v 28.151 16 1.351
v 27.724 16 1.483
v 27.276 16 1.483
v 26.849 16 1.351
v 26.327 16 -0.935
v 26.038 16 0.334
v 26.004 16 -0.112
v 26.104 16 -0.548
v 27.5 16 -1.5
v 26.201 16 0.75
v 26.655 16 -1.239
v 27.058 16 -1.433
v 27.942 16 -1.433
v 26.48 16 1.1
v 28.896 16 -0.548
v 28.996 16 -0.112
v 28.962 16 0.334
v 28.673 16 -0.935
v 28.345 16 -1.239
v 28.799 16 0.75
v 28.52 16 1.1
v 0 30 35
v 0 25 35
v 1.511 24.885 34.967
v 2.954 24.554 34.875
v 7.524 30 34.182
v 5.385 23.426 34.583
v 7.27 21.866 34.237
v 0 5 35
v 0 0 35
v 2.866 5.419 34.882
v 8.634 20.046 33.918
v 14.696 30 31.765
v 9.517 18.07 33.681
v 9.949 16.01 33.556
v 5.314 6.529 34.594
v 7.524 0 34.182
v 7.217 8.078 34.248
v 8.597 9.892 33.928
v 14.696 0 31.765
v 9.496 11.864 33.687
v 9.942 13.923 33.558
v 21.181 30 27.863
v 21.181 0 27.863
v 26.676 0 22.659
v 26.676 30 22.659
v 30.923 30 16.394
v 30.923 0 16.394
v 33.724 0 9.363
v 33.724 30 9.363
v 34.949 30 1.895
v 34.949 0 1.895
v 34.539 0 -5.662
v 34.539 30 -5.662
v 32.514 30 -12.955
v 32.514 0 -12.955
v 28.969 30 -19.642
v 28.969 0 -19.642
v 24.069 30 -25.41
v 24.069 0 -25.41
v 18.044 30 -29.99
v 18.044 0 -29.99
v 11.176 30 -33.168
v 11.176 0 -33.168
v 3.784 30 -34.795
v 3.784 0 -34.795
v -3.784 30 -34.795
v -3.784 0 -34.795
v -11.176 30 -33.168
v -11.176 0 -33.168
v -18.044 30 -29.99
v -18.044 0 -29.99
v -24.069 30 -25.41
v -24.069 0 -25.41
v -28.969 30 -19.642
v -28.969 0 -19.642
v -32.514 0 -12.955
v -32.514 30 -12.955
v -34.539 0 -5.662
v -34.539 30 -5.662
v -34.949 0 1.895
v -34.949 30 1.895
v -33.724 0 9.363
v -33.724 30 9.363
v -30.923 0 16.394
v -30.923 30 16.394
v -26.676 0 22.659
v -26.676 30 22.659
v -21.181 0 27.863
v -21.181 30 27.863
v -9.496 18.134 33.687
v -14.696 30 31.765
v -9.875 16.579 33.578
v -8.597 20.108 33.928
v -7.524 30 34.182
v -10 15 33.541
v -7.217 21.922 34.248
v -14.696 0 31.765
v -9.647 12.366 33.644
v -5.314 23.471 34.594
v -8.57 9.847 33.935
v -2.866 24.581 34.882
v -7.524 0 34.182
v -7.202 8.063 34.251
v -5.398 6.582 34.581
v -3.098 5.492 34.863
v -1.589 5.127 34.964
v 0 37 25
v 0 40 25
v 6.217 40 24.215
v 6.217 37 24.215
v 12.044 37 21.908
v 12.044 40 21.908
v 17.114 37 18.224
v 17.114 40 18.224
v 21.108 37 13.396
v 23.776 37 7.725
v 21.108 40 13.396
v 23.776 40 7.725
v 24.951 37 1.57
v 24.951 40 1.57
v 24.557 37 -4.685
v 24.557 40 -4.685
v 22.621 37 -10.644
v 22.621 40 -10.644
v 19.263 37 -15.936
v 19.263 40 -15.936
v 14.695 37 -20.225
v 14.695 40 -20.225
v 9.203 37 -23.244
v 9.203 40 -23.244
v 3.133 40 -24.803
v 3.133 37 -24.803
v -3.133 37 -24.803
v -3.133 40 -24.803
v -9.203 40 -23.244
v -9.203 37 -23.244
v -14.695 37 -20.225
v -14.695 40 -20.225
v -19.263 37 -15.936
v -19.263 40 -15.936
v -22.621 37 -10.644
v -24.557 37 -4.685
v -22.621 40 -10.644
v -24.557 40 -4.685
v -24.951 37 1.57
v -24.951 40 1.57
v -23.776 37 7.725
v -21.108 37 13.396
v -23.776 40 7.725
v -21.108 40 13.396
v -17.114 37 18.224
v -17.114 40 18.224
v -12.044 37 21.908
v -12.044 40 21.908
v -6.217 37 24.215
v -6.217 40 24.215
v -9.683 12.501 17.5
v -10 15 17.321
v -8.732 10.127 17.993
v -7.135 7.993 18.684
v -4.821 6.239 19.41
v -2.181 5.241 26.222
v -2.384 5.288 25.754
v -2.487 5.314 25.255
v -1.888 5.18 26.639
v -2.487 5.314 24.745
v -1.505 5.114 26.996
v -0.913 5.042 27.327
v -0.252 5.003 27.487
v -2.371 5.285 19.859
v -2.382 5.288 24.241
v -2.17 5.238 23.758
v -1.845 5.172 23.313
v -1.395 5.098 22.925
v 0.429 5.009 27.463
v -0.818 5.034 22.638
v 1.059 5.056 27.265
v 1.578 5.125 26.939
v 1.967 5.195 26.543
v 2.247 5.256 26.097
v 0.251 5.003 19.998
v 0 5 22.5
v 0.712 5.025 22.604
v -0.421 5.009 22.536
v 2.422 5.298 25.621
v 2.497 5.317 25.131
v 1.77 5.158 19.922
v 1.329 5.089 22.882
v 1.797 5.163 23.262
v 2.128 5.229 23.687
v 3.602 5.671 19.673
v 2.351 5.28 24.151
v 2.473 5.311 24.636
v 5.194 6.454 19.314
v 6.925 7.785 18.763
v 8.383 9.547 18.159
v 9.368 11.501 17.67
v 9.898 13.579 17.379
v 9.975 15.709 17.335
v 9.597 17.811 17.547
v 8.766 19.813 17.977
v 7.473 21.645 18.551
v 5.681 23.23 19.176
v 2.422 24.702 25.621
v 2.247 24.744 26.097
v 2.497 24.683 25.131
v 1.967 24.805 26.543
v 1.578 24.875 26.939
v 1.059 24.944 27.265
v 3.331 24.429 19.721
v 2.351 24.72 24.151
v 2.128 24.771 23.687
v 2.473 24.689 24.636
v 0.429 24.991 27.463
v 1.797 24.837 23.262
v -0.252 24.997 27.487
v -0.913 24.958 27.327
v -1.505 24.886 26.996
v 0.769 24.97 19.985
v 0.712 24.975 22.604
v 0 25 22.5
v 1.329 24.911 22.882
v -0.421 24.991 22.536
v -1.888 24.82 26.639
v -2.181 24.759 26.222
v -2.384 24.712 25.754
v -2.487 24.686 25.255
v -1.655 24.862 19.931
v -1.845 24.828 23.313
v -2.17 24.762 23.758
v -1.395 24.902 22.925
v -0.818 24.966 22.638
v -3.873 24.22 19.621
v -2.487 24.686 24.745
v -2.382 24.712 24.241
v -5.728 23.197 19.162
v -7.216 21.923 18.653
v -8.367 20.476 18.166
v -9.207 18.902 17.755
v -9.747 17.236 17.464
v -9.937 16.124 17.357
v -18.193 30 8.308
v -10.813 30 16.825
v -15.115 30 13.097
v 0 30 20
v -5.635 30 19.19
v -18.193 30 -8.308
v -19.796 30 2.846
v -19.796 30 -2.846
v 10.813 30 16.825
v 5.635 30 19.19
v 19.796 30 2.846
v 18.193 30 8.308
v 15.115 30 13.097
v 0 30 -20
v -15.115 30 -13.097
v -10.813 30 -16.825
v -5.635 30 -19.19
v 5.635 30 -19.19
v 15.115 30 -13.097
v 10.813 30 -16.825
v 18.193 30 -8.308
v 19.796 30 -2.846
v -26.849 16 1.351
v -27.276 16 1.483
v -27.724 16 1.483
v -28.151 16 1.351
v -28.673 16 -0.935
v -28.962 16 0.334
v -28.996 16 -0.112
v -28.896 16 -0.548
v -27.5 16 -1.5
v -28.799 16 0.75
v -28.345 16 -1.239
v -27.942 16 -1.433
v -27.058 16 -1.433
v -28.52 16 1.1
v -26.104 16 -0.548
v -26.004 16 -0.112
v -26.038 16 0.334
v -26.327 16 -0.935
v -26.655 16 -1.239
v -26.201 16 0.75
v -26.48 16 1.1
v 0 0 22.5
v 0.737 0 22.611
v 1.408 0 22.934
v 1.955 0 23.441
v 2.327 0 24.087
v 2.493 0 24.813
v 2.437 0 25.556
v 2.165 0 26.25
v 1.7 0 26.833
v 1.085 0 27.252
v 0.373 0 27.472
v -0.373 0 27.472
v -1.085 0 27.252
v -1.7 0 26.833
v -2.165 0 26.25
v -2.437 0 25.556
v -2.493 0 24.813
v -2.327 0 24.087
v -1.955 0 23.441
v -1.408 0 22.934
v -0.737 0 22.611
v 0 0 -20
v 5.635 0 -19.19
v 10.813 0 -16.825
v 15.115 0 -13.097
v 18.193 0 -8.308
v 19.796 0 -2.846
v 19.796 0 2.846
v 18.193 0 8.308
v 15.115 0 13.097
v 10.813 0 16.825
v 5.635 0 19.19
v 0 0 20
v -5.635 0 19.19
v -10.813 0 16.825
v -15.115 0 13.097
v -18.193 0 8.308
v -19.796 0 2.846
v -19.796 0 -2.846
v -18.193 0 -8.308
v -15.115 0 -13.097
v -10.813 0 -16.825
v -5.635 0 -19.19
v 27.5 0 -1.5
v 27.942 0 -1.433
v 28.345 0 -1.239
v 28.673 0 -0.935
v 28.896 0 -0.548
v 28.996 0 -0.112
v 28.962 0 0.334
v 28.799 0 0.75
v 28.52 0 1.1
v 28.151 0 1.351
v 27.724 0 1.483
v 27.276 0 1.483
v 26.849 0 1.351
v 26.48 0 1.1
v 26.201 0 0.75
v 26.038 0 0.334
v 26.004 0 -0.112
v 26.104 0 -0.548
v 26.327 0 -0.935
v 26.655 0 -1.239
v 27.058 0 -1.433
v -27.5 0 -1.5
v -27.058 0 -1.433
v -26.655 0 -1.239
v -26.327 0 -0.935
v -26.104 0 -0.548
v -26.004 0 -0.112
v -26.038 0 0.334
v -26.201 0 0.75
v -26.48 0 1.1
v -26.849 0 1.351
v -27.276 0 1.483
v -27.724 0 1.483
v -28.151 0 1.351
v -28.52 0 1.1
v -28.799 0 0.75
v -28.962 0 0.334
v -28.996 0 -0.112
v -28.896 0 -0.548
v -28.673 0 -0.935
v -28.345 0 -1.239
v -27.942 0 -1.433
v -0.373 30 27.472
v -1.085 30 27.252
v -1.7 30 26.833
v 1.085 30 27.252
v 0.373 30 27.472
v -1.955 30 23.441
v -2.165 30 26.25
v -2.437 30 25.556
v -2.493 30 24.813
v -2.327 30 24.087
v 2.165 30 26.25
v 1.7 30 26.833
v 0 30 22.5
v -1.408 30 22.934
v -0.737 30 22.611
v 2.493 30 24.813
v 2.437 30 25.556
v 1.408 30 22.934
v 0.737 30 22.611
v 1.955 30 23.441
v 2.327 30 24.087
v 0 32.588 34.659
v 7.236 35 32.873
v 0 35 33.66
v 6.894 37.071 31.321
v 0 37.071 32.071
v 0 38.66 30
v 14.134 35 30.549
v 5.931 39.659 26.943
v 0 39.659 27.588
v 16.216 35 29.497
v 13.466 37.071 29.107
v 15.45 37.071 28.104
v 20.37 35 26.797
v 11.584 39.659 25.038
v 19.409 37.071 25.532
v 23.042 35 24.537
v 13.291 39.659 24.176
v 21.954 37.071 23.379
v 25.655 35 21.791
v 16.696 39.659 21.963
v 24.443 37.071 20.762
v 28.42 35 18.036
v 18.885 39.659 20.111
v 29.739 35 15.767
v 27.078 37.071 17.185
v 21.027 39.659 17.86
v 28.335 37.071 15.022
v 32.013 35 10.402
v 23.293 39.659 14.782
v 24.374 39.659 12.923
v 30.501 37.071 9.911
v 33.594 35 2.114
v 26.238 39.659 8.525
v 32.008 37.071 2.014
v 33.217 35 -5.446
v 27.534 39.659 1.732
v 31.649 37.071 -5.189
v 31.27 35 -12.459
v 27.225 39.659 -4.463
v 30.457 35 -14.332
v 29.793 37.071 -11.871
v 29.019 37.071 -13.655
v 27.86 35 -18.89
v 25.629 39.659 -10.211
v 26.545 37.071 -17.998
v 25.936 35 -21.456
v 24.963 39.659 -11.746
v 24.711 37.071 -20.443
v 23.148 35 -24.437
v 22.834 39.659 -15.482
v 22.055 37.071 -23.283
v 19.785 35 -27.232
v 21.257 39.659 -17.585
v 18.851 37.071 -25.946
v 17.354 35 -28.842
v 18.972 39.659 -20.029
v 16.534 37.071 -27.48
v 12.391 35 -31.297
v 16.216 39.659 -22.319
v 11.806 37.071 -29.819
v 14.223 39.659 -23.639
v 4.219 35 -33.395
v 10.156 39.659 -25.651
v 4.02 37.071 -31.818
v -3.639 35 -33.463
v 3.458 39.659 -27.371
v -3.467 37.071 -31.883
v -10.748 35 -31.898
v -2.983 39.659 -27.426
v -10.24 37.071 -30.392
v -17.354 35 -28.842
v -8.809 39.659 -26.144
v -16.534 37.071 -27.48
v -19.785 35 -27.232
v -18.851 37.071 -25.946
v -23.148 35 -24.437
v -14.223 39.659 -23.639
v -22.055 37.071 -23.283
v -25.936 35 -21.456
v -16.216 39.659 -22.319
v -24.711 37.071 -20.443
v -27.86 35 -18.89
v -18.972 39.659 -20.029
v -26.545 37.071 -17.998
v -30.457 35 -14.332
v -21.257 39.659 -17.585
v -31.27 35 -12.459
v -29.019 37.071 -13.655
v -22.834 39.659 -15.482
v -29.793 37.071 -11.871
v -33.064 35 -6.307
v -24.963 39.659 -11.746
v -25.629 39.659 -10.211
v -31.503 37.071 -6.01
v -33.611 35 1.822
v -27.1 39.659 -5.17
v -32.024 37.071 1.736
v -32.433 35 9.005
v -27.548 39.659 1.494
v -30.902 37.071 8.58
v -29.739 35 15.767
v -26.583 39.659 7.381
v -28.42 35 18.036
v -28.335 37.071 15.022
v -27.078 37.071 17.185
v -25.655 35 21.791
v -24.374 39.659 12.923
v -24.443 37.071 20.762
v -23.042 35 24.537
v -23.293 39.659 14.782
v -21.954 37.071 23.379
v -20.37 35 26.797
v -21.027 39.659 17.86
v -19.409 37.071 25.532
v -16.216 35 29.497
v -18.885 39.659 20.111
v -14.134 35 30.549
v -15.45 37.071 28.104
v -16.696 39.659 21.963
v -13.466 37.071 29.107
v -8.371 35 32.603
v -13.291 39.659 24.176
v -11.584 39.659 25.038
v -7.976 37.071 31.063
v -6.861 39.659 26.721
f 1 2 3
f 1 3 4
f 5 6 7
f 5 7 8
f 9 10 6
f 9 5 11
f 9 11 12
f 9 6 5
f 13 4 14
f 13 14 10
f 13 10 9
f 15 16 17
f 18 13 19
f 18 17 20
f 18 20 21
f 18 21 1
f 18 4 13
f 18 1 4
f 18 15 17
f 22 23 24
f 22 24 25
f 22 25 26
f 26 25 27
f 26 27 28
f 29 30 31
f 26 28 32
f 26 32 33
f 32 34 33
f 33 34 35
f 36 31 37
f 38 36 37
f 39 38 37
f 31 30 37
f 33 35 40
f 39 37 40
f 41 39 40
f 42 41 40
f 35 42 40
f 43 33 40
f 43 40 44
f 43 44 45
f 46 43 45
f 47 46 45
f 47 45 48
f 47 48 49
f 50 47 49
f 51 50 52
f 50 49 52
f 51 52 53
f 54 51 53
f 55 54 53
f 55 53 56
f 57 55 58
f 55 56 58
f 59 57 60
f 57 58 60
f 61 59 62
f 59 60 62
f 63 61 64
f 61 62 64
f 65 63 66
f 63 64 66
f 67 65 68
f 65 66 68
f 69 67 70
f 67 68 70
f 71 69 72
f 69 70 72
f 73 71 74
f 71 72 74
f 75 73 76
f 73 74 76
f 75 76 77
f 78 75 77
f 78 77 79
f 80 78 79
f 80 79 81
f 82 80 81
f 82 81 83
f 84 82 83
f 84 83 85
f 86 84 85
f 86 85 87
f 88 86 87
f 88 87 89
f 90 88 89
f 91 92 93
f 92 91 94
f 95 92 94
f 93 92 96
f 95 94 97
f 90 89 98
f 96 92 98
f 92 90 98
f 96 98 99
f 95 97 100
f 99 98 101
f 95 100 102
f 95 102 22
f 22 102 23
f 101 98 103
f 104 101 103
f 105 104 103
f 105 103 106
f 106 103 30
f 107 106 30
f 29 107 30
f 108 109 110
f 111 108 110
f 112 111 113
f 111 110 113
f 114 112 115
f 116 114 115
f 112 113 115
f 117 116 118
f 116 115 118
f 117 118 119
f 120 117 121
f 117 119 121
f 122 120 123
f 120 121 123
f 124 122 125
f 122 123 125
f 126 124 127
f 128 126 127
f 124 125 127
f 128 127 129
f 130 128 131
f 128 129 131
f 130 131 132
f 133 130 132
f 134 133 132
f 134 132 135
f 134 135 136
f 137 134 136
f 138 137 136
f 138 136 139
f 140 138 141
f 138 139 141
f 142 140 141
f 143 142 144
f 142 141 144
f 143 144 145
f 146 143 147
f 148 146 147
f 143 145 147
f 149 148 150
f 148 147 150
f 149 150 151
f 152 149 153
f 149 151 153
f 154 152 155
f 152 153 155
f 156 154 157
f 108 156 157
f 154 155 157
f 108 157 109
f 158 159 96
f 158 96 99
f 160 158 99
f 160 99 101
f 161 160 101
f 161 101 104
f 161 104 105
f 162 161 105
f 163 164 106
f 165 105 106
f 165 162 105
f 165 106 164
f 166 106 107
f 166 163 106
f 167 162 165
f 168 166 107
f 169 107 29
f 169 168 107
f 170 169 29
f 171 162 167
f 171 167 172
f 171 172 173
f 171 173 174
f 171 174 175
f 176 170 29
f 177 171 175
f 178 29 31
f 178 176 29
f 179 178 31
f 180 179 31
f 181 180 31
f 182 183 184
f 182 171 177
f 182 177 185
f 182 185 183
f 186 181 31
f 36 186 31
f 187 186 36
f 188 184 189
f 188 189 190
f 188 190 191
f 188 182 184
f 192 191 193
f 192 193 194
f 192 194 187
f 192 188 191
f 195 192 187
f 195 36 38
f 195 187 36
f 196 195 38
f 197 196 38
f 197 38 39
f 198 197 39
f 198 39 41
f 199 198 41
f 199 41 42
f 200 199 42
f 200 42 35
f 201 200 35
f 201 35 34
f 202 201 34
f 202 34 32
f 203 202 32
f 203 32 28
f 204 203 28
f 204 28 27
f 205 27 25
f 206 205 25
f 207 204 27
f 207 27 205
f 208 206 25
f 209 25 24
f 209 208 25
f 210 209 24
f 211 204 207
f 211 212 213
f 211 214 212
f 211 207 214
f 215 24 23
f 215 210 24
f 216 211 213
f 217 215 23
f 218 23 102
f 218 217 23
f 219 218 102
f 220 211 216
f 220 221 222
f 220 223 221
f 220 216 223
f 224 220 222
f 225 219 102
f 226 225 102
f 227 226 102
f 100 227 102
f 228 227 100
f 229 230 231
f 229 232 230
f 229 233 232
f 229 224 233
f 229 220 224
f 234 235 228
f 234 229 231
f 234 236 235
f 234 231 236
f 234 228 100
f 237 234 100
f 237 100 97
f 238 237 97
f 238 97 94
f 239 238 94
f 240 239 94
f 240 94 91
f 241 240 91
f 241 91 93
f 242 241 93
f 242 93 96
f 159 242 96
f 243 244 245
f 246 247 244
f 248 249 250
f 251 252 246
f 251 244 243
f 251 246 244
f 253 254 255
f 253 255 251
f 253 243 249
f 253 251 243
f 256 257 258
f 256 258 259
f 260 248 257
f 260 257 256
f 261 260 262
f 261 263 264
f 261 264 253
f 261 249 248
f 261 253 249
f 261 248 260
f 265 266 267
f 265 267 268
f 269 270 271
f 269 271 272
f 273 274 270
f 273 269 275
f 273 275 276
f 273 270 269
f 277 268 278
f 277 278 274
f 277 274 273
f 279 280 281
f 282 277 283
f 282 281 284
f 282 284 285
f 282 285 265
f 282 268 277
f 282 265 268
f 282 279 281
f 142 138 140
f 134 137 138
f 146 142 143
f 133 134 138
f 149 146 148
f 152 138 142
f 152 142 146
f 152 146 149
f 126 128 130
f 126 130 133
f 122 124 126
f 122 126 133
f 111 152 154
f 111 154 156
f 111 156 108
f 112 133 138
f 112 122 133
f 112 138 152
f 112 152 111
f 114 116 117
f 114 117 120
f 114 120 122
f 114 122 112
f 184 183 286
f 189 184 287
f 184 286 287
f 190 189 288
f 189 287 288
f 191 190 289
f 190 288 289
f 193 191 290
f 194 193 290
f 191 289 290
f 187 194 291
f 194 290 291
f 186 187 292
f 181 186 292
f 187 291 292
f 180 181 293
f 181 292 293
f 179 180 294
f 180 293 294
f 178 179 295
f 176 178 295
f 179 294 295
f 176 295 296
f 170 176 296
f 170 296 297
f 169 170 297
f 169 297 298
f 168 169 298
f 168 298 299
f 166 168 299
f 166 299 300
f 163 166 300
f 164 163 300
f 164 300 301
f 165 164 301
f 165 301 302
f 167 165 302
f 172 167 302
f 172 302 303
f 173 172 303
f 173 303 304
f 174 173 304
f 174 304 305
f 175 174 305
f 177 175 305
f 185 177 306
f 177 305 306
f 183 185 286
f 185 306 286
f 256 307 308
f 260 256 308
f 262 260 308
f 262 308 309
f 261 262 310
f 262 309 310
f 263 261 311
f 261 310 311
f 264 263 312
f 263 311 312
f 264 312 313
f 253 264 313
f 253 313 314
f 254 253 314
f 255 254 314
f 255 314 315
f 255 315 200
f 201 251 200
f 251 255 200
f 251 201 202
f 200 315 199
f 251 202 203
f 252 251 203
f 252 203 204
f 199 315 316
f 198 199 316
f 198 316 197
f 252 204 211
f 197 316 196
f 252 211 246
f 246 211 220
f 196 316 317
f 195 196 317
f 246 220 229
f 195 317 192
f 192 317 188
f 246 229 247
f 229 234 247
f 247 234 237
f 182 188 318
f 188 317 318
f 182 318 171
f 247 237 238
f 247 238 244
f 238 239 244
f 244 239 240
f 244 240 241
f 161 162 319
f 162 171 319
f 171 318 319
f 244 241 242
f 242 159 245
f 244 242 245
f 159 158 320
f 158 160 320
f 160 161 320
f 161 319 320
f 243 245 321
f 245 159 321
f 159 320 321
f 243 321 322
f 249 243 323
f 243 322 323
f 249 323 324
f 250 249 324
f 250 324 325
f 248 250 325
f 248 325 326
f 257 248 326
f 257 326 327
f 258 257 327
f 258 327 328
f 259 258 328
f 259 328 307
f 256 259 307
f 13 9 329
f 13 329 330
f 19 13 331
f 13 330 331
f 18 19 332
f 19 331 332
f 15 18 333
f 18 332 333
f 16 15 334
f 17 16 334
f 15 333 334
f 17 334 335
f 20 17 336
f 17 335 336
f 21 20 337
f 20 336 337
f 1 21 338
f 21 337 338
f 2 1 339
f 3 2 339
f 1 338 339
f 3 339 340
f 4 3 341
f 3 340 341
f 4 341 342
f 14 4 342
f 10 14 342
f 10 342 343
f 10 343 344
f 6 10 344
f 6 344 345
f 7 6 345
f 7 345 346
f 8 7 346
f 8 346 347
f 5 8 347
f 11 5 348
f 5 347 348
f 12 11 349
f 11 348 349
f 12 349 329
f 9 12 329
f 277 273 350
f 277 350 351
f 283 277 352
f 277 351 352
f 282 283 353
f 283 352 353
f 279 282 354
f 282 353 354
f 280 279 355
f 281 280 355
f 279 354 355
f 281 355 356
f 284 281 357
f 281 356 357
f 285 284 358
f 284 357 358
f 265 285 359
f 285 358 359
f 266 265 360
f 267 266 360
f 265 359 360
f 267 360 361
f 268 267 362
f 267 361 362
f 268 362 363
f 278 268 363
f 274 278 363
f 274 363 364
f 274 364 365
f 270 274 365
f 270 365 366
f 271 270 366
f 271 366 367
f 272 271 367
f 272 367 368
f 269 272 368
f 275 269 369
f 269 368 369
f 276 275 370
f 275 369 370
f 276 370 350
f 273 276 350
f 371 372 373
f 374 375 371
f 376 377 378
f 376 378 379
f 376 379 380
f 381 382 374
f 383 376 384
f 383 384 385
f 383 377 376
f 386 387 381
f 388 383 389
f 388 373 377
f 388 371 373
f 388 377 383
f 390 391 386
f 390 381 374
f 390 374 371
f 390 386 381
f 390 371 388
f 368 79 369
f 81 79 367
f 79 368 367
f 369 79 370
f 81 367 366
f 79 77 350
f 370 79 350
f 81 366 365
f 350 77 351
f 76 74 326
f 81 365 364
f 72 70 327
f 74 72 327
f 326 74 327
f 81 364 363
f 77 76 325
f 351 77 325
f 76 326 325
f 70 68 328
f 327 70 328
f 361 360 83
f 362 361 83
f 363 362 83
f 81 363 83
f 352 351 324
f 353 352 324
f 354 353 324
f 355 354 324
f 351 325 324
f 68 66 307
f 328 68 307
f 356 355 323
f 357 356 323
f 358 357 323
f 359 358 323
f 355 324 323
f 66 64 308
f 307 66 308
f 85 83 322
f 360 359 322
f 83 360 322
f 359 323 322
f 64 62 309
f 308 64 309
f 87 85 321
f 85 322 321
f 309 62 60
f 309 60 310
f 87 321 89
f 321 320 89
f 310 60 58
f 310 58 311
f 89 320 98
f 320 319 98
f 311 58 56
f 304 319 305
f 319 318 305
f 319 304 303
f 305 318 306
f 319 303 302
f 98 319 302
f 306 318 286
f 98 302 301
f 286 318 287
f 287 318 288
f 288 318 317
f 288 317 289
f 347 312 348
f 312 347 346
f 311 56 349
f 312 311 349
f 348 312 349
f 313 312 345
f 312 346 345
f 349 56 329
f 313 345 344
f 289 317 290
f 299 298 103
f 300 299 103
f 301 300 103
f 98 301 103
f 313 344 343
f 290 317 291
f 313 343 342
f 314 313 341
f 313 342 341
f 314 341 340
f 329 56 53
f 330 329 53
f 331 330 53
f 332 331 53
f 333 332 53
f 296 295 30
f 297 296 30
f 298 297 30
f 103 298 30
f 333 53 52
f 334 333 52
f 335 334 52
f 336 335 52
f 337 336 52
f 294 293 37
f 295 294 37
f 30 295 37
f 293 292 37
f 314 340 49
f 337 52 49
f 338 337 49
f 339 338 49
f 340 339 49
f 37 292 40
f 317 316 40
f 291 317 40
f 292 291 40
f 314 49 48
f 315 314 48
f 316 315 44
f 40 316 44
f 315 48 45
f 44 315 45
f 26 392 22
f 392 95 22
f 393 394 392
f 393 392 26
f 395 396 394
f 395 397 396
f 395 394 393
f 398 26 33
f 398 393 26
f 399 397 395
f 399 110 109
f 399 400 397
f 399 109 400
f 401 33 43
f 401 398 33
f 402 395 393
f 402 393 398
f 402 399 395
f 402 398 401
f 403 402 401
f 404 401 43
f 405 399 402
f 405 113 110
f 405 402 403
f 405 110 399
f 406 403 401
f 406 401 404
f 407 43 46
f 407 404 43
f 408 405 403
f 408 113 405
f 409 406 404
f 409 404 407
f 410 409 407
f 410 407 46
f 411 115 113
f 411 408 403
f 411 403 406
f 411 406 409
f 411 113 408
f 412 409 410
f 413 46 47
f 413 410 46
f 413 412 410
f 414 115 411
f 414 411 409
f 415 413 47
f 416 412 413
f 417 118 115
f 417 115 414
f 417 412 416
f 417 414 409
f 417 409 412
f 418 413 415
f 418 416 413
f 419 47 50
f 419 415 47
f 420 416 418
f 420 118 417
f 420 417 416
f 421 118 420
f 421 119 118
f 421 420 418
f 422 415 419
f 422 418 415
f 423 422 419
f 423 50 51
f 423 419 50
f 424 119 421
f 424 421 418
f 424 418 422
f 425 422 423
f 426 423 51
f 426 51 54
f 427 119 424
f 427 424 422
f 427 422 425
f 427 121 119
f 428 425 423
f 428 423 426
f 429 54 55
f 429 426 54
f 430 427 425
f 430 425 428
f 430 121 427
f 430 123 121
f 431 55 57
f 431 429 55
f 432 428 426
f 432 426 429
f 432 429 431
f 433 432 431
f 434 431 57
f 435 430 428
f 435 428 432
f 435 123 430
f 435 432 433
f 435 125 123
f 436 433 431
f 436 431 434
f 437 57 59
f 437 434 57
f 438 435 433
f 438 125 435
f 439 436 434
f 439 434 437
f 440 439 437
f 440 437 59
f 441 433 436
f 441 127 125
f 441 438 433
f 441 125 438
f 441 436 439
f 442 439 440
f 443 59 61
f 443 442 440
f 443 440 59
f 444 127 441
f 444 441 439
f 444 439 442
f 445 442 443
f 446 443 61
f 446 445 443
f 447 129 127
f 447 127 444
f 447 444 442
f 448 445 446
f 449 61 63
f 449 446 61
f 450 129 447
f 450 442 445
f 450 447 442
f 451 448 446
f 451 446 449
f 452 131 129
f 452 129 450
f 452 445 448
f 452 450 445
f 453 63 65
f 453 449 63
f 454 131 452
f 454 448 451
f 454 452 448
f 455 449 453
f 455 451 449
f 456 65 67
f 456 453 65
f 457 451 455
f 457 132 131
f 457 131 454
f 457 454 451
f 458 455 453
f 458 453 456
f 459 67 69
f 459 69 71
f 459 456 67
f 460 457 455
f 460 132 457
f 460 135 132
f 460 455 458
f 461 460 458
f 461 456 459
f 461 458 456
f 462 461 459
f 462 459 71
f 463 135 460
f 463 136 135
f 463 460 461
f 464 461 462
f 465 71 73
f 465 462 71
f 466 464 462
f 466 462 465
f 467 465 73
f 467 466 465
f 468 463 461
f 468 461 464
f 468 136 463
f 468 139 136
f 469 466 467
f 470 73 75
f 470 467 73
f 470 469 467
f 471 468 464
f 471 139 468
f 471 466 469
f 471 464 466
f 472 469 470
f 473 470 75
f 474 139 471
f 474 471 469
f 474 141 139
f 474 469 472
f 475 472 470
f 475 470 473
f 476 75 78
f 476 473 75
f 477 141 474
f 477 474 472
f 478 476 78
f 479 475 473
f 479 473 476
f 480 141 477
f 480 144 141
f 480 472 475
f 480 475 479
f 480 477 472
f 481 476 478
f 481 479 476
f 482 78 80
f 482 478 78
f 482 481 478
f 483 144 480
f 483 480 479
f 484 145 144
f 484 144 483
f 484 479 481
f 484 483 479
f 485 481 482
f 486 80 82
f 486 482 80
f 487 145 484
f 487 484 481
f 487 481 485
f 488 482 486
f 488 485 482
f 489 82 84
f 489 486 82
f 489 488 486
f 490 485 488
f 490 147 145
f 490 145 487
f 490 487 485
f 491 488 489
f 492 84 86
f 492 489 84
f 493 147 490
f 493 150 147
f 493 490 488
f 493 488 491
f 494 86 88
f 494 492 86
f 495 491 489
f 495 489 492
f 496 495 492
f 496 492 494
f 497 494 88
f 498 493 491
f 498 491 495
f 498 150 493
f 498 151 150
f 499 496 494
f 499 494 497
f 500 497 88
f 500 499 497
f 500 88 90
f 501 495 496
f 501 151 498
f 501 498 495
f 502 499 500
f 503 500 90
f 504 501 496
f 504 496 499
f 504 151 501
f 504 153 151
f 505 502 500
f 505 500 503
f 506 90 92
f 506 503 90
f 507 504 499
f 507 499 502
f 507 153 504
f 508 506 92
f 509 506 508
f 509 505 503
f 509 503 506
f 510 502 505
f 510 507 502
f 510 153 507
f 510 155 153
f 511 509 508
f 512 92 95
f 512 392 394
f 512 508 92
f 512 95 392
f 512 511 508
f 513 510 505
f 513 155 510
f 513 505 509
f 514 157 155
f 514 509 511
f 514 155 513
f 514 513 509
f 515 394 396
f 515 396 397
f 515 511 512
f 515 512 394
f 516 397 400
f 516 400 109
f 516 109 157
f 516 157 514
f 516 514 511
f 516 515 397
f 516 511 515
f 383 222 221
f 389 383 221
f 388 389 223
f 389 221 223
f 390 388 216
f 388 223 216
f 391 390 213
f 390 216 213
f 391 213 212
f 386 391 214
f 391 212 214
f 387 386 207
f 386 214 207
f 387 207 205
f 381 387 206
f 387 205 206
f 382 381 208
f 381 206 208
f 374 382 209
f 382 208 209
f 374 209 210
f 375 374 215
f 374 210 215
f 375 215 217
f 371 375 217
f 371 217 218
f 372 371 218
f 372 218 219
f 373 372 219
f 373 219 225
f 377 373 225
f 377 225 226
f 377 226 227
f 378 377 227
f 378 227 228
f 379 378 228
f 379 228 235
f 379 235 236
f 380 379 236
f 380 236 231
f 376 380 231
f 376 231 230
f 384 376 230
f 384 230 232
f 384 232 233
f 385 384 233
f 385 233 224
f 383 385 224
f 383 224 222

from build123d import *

# Parameters (mm, degrees)
ESQUISSE2_R             = 35
BOSS_EXTRU_1_DEPTH      = 40
CONG_1_R                = 10
ESQUISSE3_R             = 20
ENL_V_MAT_EXTRU_1_DEPTH = 30
ESQUISSE7_R             = 25
ENL_V_MAT_EXTRU_3_DEPTH = 3
ESQUISSE8_R             = 10
ENL_V_MAT_EXTRU_4_DEPTH = 45
ESQUISSE4_R             = 2.5
ENL_V_MAT_EXTRU_5_DEPTH = 30
ESQUISSE9_R             = 1.5
ENL_V_MAT_EXTRU_6_DEPTH = 16


with BuildPart() as part:
    # Esquisse2 → Boss.-Extru.1 (new body)
    with BuildSketch(Plane(origin=(0, 0, 0), x_dir=(1, 0, 0), z_dir=(0, 1, 0))):
        with Locations(Location((0, 0, 0), (0, 0, 270))):
            Circle(ESQUISSE2_R)
    extrude(amount=BOSS_EXTRU_1_DEPTH)

    # Congé1
    cong_1_edges = [part.edges().sort_by_distance(p)[0] for p in [
        (0, 40, -35),
    ]]
    fillet(cong_1_edges, radius=CONG_1_R)

    # Esquisse3 → Enlèv. mat.-Extru.1 (cut)
    with BuildSketch(Plane.XZ):
        with Locations(Location((0, 0, 0), (0, 0, 270))):
            Circle(ESQUISSE3_R)
    extrude(amount=-ENL_V_MAT_EXTRU_1_DEPTH, mode=Mode.SUBTRACT)

    # Esquisse7 → Enlèv. mat.-Extru.3 (cut)
    with BuildSketch(Plane(origin=(0, 40, 0), x_dir=(1, 0, 0), z_dir=(0, 1, 0))):
        with Locations(Location((0, 0, 0), (0, 0, 270))):
            Circle(ESQUISSE7_R)
    extrude(amount=-ENL_V_MAT_EXTRU_3_DEPTH, mode=Mode.SUBTRACT)

    # Esquisse8 → Enlèv. mat.-Extru.4 (cut)
    with BuildSketch(Plane.XY):
        with Locations(Location((0, 15, 0), (0, 0, 180))):
            Circle(ESQUISSE8_R)
    extrude(amount=ENL_V_MAT_EXTRU_4_DEPTH, mode=Mode.SUBTRACT)

    # Esquisse4 → Enlèv. mat.-Extru.5 (cut)
    with BuildSketch(Plane.XZ):
        with Locations(Location((0, 25, 0), (0, 0, 270))):
            Circle(ESQUISSE4_R)
    extrude(amount=-ENL_V_MAT_EXTRU_5_DEPTH, mode=Mode.SUBTRACT)

    # Esquisse9 → Enlèv. mat.-Extru.6 (cut)
    with BuildSketch(Plane.XZ):
        with Locations(Location((-27.5, 0, 0), (0, 0, 270))):
            Circle(ESQUISSE9_R)
        with Locations(Location((27.5, 0, 0), (0, 0, 270))):
            Circle(ESQUISSE9_R)
    extrude(amount=-ENL_V_MAT_EXTRU_6_DEPTH, mode=Mode.SUBTRACT)


solid = part.part
